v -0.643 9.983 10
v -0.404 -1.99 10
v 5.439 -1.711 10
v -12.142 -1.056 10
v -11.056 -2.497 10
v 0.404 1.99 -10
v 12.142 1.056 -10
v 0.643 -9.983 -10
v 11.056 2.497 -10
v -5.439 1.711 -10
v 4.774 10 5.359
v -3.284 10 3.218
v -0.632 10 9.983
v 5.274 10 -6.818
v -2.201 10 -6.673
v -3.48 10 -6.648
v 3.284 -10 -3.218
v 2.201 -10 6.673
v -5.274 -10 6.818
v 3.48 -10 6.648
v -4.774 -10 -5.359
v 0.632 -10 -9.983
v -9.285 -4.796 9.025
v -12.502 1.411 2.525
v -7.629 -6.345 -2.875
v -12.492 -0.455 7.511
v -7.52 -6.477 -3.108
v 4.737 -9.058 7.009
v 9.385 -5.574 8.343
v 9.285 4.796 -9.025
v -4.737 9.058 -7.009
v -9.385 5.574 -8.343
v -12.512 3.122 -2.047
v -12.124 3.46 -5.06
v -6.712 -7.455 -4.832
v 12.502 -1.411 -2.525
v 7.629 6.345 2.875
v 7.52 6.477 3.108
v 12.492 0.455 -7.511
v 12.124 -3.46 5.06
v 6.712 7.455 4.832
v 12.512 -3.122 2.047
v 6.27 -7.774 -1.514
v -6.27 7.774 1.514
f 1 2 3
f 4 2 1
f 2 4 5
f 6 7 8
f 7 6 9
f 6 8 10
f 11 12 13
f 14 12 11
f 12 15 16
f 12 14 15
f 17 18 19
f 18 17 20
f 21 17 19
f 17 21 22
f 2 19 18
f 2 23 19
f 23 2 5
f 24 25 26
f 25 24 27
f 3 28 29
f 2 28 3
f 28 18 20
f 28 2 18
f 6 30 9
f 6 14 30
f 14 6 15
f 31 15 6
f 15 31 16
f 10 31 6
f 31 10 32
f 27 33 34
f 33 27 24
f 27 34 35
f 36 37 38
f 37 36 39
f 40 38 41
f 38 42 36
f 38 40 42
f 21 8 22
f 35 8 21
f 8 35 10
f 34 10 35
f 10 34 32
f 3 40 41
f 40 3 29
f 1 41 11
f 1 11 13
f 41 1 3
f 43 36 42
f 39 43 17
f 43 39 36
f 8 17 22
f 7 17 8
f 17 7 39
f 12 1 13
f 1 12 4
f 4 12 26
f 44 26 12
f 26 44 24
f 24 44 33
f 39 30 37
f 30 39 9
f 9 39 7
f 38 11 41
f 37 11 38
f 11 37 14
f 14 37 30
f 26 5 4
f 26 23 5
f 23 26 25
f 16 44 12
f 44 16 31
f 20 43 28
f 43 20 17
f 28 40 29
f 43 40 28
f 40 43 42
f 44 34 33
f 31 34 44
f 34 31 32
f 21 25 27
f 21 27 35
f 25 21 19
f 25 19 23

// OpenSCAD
echo(version=version());

intersection_for(i = [
      [0, 0, 0],
      [10, 20, 300],
      [200, 40, 57],
      [20, 88, 57]
    ])
  rotate(i) cube([100, 20, 20], center = true);

// Written by Clifford Wolf <clifford@clifford.at> and Marius
// Kintel <marius@kintel.net>
//
// To the extent possible under law, the author(s) have dedicated all
// copyright and related and neighboring rights to this software to the
// public domain worldwide. This software is distributed without any
// warranty.
//
// You should have received a copy of the CC0 Public Domain
// Dedication along with this software.
// If not, see <http://creativecommons.org/publicdomain/zero/1.0/>.
